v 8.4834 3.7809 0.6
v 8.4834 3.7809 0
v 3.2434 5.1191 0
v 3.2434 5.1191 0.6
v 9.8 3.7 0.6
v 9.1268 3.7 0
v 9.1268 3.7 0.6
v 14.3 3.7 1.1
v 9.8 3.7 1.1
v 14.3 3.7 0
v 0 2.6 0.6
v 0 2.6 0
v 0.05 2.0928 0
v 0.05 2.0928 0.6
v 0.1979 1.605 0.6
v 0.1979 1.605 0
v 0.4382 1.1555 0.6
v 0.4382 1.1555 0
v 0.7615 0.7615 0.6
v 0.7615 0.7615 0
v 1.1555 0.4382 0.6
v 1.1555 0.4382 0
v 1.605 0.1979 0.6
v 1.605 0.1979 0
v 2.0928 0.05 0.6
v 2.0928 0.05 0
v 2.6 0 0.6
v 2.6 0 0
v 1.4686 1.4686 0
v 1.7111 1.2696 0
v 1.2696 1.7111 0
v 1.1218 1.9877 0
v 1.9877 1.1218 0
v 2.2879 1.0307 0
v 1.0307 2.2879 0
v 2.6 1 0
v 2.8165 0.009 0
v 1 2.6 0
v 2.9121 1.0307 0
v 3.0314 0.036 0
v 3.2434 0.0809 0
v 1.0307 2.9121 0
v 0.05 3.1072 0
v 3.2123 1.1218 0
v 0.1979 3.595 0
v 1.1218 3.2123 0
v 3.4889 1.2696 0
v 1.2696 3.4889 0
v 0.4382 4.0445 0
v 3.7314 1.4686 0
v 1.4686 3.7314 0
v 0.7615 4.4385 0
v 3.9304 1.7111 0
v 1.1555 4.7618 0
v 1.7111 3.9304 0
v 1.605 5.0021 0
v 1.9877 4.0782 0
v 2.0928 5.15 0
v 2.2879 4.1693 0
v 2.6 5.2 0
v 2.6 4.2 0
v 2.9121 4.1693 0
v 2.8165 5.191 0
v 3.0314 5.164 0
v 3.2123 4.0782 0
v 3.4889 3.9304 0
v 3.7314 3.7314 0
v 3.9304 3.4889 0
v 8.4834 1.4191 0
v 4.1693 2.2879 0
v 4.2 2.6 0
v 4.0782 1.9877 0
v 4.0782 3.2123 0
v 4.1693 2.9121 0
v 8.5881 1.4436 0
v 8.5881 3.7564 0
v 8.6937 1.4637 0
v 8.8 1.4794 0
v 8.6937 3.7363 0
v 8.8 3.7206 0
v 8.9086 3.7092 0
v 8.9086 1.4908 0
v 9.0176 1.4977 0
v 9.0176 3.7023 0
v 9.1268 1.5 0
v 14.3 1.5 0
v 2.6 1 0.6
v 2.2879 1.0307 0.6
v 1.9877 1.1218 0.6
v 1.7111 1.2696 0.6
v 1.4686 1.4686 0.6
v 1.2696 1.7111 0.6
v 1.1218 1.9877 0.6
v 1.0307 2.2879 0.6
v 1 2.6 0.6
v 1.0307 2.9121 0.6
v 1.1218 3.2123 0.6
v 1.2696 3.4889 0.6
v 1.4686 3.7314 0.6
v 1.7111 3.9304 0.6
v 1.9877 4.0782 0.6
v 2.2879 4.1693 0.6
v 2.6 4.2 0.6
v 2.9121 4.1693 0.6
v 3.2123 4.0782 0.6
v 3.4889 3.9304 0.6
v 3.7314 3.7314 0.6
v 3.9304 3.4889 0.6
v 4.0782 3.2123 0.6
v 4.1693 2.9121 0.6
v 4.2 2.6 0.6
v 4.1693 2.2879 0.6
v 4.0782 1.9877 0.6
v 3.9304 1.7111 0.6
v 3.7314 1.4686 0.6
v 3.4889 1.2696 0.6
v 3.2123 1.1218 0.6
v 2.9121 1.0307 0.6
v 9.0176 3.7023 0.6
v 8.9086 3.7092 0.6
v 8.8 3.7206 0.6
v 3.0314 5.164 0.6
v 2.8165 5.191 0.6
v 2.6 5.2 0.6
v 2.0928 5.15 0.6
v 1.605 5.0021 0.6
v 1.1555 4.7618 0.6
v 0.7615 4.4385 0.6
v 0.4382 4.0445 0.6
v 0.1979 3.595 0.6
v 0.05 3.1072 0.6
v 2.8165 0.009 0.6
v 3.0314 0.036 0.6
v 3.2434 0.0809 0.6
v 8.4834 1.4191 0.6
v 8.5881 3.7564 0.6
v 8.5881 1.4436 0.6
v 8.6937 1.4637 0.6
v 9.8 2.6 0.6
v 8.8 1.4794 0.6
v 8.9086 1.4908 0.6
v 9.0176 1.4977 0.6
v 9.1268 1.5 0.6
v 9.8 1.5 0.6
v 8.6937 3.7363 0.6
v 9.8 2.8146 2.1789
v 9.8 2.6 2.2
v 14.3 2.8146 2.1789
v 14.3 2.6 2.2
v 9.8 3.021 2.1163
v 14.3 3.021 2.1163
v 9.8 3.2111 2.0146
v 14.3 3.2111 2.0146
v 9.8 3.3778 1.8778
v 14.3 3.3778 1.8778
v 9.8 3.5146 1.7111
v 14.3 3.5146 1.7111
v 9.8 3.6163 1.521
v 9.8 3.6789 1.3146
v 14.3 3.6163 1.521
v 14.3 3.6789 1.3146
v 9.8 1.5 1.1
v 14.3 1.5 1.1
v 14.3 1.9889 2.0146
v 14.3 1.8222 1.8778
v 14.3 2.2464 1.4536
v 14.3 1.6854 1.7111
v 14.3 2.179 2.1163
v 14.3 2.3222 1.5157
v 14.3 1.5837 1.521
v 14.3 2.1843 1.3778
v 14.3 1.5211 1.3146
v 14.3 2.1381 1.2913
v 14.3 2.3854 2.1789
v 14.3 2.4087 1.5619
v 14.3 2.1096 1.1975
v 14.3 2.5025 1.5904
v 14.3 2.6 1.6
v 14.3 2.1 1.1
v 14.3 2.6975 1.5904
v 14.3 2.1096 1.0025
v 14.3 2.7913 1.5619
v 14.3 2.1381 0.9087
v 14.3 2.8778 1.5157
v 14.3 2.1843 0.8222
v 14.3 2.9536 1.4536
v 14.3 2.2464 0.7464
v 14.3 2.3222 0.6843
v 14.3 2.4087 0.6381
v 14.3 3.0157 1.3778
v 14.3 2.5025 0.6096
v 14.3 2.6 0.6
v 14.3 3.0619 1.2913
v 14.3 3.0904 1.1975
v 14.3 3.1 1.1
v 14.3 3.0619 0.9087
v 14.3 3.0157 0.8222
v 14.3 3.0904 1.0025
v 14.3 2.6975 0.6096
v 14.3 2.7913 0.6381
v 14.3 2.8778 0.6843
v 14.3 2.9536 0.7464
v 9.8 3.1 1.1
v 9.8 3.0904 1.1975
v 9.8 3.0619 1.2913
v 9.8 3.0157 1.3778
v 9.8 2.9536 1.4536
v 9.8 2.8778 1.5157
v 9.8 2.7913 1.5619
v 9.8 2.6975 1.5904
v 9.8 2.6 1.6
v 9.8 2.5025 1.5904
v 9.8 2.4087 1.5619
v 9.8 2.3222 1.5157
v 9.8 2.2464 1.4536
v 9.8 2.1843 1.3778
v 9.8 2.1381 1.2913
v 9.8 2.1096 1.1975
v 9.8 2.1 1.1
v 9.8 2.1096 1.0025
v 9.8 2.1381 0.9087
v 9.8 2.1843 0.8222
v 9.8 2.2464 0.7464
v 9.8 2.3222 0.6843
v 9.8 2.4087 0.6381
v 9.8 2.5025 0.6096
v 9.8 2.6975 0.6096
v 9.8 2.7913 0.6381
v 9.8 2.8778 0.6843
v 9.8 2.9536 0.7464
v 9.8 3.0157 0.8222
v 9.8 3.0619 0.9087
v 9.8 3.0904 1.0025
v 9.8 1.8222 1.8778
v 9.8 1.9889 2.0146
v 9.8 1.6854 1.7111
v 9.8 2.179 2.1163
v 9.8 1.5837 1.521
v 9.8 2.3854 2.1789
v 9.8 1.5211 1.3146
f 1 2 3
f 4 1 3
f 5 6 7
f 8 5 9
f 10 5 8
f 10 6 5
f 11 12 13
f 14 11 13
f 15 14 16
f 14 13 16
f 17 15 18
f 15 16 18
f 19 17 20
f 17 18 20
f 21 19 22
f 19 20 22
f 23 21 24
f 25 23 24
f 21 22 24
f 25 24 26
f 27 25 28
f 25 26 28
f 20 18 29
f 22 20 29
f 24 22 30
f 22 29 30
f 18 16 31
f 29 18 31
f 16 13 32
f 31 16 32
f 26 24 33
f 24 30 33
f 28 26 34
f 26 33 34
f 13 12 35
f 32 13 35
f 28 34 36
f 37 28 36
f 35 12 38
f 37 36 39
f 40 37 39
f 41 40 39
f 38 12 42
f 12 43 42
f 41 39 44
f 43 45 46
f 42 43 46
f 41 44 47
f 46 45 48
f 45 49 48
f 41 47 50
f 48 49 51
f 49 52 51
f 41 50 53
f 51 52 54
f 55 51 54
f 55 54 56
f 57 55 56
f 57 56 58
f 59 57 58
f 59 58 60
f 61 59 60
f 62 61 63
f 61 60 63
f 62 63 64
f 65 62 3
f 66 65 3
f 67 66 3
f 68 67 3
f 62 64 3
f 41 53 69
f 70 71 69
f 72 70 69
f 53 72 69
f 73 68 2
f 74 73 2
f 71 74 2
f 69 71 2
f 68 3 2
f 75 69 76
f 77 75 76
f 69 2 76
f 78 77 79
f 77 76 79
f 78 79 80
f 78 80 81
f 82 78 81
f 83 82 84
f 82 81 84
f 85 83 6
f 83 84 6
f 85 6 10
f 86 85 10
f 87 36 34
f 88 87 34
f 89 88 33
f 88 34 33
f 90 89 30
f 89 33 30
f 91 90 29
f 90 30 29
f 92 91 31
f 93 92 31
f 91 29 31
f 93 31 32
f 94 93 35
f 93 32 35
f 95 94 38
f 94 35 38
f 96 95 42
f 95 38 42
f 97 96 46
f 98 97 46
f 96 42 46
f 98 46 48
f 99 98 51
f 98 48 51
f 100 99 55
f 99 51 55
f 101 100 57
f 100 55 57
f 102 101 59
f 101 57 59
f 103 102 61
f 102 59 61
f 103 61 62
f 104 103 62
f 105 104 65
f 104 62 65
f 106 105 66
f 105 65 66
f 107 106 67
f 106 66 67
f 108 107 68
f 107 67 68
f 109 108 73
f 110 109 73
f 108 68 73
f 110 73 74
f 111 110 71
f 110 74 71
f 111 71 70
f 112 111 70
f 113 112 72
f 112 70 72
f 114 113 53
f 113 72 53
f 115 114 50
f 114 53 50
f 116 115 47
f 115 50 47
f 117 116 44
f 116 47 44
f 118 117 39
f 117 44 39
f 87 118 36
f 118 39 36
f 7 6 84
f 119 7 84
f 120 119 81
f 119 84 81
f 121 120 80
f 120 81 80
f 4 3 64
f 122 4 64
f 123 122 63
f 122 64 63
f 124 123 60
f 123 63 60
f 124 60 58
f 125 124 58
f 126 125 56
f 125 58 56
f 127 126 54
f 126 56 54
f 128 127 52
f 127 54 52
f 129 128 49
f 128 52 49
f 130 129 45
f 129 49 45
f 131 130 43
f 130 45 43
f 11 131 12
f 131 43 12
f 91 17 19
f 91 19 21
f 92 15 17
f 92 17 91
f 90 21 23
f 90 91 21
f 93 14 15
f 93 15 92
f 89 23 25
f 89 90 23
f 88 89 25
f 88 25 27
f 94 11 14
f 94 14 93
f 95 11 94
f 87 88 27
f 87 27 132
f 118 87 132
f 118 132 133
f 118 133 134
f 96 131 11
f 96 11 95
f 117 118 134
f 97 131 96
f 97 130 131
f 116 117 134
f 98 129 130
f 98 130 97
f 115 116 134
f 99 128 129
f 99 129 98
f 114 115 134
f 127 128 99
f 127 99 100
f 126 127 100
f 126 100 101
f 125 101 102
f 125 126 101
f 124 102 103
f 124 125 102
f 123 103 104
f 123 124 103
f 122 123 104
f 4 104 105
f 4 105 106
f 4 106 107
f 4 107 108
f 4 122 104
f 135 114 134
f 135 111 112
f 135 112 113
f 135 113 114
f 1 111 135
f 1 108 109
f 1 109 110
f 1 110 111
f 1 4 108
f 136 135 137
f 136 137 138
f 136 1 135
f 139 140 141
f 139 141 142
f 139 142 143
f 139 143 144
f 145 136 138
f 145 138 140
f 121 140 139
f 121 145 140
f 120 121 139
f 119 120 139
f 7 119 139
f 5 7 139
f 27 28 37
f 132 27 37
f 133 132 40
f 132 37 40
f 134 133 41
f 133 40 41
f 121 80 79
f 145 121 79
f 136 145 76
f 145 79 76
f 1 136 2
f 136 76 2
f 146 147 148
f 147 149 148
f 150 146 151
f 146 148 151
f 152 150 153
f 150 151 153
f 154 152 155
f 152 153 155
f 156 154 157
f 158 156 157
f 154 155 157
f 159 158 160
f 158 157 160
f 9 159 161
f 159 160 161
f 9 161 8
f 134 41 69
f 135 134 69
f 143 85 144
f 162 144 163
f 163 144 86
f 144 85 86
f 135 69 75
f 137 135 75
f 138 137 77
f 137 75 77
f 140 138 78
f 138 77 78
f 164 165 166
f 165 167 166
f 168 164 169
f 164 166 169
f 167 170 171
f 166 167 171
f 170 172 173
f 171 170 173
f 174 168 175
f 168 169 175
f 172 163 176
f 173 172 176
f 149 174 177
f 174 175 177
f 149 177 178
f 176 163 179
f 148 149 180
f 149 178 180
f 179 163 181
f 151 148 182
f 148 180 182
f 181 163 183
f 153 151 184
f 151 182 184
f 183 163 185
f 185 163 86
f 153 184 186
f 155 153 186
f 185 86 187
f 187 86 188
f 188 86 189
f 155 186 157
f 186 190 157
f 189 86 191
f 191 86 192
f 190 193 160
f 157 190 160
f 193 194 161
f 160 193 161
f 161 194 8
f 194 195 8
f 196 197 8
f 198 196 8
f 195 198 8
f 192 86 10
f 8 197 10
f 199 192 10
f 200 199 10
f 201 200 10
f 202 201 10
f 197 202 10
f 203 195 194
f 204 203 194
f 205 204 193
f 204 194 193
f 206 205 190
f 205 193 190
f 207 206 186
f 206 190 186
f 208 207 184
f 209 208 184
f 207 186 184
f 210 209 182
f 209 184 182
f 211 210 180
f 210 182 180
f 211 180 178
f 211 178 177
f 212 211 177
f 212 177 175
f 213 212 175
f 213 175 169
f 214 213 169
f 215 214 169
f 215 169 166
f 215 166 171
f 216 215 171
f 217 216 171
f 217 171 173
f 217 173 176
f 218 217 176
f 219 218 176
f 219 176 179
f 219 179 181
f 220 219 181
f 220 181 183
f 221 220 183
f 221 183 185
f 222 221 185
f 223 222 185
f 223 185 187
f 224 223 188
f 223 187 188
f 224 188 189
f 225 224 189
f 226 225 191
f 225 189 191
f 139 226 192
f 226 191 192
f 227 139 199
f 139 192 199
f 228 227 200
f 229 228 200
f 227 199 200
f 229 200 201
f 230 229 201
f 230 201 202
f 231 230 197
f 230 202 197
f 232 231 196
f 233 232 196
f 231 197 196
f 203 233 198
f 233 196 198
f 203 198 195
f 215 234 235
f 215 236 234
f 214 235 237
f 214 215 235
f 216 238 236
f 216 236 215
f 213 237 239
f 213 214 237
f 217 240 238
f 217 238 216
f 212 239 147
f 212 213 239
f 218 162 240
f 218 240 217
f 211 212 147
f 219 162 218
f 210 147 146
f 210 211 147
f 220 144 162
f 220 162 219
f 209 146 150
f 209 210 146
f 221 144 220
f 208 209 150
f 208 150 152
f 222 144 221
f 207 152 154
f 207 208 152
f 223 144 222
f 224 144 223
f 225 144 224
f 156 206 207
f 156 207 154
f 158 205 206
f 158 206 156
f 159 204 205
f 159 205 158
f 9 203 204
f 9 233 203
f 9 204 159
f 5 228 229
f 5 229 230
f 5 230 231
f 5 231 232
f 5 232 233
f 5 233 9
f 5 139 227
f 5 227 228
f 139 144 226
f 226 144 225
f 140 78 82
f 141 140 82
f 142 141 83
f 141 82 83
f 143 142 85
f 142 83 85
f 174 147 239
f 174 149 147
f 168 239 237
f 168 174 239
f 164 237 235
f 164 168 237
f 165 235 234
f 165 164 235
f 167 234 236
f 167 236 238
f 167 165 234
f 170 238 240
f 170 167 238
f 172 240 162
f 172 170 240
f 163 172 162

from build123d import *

# Parameters (mm, degrees)
F0_W     = 4.5
F0_H     = 1.1
F1_DEPTH = 0.6
F2_W     = 4.5
F2_H     = 2.2
F3_DEPTH = 1.6
F4_R     = 1.09999
F5_R     = 0.5
F6_DEPTH = 25


# Not quite as in the source:
# - a fillet or chamfer is up to 0.001 mm smaller than in the source, because OpenCascade refuses the exact size


with BuildPart() as f1:
    # F0 (on Top) → F1 (new body)
    with BuildSketch(Plane.XY):
        with Locations((12.05, 2.05)):
            Rectangle(F0_W, F0_H)
        with Locations((12.05, 3.15)):
            Rectangle(F0_W, F0_H)
        with BuildLine():
            Line((9.1267705413, 1.5), (9.8, 1.5))
            Line((9.8, 1.5), (9.8, 2.6))
            Line((9.8, 2.6), (8.8, 2.6))
            Line((8.8, 2.6), (8.8, 1.4793838437))
            ThreePointArc((8.8, 1.4793838437), (8.9630604221, 1.4948408423), (9.1267705413, 1.5))
        make_face()
        with BuildLine():
            Line((8.8, 2.6), (9.8, 2.6))
            Line((9.8, 2.6), (9.8, 3.7))
            Line((9.8, 3.7), (9.1267705413, 3.7))
            ThreePointArc((9.1267705413, 3.7), (8.9630604221, 3.7051591577), (8.8, 3.7206161563))
            Line((8.8, 3.7206161563), (8.8, 2.6))
        make_face()
        with BuildLine():
            Line((8.8, 1.4793838437), (8.8, 2.6))
            Line((8.8, 2.6), (8.8, 3.7206161563))
            ThreePointArc((8.8, 3.7206161563), (8.6407616767, 3.7458278477), (8.4833920771, 3.7808604342))
            Line((8.4833920771, 3.7808604342), (3.2433784641, 5.1191395658))
            ThreePointArc((3.2433784641, 5.1191395658), (2.9242199323, 5.1797056878), (2.6, 5.2))
            Line((2.6, 5.2), (2.6, 4.2))
            ThreePointArc((2.6, 4.2), (3.7313708499, 3.7313708499), (4.2, 2.6))
            ThreePointArc((4.2, 2.6), (3.7313708499, 1.4686291501), (2.6, 1))
            Line((2.6, 1), (2.6, 0))
            ThreePointArc((2.6, 0), (2.9242199323, 0.0202943122), (3.2433784641, 0.0808604342))
            Line((3.2433784641, 0.0808604342), (8.4833920771, 1.4191395658))
            ThreePointArc((8.4833920771, 1.4191395658), (8.6407616767, 1.4541721523), (8.8, 1.4793838437))
        make_face()
        with BuildLine():
            ThreePointArc((0, 2.6), (0.7615223689, 0.7615223689), (2.6, 0))
            Line((2.6, 0), (2.6, 1))
            ThreePointArc((2.6, 1), (1, 2.6), (2.6, 4.2))
            Line((2.6, 4.2), (2.6, 5.2))
            ThreePointArc((2.6, 5.2), (0.7615223689, 4.4384776311), (0, 2.6))
        make_face()
    extrude(amount=F1_DEPTH)

    # F2 (on face) → F3 (join)
    with BuildSketch(Plane.XY.offset(0.6)):
        with Locations((12.05, 2.6)):
            Rectangle(F2_W, F2_H)
    extrude(amount=F3_DEPTH)

    # F4 (radius 1.1 in the source; OpenCascade refuses exactly that, so slightly less here)
    f4_edges = [f1.edges().sort_by_distance(p)[0] for p in [
        (12.05, 1.5, 2.2),
        (12.05, 3.7, 2.2),
    ]]
    fillet(f4_edges, radius=F4_R)

    # F5 (on face) → F6 (cut)
    with BuildSketch(Plane.YZ.offset(14.3)):
        with Locations((2.6, 1.1)):
            Circle(F5_R)
    extrude(amount=-F6_DEPTH, mode=Mode.SUBTRACT)


solid = f1.part
